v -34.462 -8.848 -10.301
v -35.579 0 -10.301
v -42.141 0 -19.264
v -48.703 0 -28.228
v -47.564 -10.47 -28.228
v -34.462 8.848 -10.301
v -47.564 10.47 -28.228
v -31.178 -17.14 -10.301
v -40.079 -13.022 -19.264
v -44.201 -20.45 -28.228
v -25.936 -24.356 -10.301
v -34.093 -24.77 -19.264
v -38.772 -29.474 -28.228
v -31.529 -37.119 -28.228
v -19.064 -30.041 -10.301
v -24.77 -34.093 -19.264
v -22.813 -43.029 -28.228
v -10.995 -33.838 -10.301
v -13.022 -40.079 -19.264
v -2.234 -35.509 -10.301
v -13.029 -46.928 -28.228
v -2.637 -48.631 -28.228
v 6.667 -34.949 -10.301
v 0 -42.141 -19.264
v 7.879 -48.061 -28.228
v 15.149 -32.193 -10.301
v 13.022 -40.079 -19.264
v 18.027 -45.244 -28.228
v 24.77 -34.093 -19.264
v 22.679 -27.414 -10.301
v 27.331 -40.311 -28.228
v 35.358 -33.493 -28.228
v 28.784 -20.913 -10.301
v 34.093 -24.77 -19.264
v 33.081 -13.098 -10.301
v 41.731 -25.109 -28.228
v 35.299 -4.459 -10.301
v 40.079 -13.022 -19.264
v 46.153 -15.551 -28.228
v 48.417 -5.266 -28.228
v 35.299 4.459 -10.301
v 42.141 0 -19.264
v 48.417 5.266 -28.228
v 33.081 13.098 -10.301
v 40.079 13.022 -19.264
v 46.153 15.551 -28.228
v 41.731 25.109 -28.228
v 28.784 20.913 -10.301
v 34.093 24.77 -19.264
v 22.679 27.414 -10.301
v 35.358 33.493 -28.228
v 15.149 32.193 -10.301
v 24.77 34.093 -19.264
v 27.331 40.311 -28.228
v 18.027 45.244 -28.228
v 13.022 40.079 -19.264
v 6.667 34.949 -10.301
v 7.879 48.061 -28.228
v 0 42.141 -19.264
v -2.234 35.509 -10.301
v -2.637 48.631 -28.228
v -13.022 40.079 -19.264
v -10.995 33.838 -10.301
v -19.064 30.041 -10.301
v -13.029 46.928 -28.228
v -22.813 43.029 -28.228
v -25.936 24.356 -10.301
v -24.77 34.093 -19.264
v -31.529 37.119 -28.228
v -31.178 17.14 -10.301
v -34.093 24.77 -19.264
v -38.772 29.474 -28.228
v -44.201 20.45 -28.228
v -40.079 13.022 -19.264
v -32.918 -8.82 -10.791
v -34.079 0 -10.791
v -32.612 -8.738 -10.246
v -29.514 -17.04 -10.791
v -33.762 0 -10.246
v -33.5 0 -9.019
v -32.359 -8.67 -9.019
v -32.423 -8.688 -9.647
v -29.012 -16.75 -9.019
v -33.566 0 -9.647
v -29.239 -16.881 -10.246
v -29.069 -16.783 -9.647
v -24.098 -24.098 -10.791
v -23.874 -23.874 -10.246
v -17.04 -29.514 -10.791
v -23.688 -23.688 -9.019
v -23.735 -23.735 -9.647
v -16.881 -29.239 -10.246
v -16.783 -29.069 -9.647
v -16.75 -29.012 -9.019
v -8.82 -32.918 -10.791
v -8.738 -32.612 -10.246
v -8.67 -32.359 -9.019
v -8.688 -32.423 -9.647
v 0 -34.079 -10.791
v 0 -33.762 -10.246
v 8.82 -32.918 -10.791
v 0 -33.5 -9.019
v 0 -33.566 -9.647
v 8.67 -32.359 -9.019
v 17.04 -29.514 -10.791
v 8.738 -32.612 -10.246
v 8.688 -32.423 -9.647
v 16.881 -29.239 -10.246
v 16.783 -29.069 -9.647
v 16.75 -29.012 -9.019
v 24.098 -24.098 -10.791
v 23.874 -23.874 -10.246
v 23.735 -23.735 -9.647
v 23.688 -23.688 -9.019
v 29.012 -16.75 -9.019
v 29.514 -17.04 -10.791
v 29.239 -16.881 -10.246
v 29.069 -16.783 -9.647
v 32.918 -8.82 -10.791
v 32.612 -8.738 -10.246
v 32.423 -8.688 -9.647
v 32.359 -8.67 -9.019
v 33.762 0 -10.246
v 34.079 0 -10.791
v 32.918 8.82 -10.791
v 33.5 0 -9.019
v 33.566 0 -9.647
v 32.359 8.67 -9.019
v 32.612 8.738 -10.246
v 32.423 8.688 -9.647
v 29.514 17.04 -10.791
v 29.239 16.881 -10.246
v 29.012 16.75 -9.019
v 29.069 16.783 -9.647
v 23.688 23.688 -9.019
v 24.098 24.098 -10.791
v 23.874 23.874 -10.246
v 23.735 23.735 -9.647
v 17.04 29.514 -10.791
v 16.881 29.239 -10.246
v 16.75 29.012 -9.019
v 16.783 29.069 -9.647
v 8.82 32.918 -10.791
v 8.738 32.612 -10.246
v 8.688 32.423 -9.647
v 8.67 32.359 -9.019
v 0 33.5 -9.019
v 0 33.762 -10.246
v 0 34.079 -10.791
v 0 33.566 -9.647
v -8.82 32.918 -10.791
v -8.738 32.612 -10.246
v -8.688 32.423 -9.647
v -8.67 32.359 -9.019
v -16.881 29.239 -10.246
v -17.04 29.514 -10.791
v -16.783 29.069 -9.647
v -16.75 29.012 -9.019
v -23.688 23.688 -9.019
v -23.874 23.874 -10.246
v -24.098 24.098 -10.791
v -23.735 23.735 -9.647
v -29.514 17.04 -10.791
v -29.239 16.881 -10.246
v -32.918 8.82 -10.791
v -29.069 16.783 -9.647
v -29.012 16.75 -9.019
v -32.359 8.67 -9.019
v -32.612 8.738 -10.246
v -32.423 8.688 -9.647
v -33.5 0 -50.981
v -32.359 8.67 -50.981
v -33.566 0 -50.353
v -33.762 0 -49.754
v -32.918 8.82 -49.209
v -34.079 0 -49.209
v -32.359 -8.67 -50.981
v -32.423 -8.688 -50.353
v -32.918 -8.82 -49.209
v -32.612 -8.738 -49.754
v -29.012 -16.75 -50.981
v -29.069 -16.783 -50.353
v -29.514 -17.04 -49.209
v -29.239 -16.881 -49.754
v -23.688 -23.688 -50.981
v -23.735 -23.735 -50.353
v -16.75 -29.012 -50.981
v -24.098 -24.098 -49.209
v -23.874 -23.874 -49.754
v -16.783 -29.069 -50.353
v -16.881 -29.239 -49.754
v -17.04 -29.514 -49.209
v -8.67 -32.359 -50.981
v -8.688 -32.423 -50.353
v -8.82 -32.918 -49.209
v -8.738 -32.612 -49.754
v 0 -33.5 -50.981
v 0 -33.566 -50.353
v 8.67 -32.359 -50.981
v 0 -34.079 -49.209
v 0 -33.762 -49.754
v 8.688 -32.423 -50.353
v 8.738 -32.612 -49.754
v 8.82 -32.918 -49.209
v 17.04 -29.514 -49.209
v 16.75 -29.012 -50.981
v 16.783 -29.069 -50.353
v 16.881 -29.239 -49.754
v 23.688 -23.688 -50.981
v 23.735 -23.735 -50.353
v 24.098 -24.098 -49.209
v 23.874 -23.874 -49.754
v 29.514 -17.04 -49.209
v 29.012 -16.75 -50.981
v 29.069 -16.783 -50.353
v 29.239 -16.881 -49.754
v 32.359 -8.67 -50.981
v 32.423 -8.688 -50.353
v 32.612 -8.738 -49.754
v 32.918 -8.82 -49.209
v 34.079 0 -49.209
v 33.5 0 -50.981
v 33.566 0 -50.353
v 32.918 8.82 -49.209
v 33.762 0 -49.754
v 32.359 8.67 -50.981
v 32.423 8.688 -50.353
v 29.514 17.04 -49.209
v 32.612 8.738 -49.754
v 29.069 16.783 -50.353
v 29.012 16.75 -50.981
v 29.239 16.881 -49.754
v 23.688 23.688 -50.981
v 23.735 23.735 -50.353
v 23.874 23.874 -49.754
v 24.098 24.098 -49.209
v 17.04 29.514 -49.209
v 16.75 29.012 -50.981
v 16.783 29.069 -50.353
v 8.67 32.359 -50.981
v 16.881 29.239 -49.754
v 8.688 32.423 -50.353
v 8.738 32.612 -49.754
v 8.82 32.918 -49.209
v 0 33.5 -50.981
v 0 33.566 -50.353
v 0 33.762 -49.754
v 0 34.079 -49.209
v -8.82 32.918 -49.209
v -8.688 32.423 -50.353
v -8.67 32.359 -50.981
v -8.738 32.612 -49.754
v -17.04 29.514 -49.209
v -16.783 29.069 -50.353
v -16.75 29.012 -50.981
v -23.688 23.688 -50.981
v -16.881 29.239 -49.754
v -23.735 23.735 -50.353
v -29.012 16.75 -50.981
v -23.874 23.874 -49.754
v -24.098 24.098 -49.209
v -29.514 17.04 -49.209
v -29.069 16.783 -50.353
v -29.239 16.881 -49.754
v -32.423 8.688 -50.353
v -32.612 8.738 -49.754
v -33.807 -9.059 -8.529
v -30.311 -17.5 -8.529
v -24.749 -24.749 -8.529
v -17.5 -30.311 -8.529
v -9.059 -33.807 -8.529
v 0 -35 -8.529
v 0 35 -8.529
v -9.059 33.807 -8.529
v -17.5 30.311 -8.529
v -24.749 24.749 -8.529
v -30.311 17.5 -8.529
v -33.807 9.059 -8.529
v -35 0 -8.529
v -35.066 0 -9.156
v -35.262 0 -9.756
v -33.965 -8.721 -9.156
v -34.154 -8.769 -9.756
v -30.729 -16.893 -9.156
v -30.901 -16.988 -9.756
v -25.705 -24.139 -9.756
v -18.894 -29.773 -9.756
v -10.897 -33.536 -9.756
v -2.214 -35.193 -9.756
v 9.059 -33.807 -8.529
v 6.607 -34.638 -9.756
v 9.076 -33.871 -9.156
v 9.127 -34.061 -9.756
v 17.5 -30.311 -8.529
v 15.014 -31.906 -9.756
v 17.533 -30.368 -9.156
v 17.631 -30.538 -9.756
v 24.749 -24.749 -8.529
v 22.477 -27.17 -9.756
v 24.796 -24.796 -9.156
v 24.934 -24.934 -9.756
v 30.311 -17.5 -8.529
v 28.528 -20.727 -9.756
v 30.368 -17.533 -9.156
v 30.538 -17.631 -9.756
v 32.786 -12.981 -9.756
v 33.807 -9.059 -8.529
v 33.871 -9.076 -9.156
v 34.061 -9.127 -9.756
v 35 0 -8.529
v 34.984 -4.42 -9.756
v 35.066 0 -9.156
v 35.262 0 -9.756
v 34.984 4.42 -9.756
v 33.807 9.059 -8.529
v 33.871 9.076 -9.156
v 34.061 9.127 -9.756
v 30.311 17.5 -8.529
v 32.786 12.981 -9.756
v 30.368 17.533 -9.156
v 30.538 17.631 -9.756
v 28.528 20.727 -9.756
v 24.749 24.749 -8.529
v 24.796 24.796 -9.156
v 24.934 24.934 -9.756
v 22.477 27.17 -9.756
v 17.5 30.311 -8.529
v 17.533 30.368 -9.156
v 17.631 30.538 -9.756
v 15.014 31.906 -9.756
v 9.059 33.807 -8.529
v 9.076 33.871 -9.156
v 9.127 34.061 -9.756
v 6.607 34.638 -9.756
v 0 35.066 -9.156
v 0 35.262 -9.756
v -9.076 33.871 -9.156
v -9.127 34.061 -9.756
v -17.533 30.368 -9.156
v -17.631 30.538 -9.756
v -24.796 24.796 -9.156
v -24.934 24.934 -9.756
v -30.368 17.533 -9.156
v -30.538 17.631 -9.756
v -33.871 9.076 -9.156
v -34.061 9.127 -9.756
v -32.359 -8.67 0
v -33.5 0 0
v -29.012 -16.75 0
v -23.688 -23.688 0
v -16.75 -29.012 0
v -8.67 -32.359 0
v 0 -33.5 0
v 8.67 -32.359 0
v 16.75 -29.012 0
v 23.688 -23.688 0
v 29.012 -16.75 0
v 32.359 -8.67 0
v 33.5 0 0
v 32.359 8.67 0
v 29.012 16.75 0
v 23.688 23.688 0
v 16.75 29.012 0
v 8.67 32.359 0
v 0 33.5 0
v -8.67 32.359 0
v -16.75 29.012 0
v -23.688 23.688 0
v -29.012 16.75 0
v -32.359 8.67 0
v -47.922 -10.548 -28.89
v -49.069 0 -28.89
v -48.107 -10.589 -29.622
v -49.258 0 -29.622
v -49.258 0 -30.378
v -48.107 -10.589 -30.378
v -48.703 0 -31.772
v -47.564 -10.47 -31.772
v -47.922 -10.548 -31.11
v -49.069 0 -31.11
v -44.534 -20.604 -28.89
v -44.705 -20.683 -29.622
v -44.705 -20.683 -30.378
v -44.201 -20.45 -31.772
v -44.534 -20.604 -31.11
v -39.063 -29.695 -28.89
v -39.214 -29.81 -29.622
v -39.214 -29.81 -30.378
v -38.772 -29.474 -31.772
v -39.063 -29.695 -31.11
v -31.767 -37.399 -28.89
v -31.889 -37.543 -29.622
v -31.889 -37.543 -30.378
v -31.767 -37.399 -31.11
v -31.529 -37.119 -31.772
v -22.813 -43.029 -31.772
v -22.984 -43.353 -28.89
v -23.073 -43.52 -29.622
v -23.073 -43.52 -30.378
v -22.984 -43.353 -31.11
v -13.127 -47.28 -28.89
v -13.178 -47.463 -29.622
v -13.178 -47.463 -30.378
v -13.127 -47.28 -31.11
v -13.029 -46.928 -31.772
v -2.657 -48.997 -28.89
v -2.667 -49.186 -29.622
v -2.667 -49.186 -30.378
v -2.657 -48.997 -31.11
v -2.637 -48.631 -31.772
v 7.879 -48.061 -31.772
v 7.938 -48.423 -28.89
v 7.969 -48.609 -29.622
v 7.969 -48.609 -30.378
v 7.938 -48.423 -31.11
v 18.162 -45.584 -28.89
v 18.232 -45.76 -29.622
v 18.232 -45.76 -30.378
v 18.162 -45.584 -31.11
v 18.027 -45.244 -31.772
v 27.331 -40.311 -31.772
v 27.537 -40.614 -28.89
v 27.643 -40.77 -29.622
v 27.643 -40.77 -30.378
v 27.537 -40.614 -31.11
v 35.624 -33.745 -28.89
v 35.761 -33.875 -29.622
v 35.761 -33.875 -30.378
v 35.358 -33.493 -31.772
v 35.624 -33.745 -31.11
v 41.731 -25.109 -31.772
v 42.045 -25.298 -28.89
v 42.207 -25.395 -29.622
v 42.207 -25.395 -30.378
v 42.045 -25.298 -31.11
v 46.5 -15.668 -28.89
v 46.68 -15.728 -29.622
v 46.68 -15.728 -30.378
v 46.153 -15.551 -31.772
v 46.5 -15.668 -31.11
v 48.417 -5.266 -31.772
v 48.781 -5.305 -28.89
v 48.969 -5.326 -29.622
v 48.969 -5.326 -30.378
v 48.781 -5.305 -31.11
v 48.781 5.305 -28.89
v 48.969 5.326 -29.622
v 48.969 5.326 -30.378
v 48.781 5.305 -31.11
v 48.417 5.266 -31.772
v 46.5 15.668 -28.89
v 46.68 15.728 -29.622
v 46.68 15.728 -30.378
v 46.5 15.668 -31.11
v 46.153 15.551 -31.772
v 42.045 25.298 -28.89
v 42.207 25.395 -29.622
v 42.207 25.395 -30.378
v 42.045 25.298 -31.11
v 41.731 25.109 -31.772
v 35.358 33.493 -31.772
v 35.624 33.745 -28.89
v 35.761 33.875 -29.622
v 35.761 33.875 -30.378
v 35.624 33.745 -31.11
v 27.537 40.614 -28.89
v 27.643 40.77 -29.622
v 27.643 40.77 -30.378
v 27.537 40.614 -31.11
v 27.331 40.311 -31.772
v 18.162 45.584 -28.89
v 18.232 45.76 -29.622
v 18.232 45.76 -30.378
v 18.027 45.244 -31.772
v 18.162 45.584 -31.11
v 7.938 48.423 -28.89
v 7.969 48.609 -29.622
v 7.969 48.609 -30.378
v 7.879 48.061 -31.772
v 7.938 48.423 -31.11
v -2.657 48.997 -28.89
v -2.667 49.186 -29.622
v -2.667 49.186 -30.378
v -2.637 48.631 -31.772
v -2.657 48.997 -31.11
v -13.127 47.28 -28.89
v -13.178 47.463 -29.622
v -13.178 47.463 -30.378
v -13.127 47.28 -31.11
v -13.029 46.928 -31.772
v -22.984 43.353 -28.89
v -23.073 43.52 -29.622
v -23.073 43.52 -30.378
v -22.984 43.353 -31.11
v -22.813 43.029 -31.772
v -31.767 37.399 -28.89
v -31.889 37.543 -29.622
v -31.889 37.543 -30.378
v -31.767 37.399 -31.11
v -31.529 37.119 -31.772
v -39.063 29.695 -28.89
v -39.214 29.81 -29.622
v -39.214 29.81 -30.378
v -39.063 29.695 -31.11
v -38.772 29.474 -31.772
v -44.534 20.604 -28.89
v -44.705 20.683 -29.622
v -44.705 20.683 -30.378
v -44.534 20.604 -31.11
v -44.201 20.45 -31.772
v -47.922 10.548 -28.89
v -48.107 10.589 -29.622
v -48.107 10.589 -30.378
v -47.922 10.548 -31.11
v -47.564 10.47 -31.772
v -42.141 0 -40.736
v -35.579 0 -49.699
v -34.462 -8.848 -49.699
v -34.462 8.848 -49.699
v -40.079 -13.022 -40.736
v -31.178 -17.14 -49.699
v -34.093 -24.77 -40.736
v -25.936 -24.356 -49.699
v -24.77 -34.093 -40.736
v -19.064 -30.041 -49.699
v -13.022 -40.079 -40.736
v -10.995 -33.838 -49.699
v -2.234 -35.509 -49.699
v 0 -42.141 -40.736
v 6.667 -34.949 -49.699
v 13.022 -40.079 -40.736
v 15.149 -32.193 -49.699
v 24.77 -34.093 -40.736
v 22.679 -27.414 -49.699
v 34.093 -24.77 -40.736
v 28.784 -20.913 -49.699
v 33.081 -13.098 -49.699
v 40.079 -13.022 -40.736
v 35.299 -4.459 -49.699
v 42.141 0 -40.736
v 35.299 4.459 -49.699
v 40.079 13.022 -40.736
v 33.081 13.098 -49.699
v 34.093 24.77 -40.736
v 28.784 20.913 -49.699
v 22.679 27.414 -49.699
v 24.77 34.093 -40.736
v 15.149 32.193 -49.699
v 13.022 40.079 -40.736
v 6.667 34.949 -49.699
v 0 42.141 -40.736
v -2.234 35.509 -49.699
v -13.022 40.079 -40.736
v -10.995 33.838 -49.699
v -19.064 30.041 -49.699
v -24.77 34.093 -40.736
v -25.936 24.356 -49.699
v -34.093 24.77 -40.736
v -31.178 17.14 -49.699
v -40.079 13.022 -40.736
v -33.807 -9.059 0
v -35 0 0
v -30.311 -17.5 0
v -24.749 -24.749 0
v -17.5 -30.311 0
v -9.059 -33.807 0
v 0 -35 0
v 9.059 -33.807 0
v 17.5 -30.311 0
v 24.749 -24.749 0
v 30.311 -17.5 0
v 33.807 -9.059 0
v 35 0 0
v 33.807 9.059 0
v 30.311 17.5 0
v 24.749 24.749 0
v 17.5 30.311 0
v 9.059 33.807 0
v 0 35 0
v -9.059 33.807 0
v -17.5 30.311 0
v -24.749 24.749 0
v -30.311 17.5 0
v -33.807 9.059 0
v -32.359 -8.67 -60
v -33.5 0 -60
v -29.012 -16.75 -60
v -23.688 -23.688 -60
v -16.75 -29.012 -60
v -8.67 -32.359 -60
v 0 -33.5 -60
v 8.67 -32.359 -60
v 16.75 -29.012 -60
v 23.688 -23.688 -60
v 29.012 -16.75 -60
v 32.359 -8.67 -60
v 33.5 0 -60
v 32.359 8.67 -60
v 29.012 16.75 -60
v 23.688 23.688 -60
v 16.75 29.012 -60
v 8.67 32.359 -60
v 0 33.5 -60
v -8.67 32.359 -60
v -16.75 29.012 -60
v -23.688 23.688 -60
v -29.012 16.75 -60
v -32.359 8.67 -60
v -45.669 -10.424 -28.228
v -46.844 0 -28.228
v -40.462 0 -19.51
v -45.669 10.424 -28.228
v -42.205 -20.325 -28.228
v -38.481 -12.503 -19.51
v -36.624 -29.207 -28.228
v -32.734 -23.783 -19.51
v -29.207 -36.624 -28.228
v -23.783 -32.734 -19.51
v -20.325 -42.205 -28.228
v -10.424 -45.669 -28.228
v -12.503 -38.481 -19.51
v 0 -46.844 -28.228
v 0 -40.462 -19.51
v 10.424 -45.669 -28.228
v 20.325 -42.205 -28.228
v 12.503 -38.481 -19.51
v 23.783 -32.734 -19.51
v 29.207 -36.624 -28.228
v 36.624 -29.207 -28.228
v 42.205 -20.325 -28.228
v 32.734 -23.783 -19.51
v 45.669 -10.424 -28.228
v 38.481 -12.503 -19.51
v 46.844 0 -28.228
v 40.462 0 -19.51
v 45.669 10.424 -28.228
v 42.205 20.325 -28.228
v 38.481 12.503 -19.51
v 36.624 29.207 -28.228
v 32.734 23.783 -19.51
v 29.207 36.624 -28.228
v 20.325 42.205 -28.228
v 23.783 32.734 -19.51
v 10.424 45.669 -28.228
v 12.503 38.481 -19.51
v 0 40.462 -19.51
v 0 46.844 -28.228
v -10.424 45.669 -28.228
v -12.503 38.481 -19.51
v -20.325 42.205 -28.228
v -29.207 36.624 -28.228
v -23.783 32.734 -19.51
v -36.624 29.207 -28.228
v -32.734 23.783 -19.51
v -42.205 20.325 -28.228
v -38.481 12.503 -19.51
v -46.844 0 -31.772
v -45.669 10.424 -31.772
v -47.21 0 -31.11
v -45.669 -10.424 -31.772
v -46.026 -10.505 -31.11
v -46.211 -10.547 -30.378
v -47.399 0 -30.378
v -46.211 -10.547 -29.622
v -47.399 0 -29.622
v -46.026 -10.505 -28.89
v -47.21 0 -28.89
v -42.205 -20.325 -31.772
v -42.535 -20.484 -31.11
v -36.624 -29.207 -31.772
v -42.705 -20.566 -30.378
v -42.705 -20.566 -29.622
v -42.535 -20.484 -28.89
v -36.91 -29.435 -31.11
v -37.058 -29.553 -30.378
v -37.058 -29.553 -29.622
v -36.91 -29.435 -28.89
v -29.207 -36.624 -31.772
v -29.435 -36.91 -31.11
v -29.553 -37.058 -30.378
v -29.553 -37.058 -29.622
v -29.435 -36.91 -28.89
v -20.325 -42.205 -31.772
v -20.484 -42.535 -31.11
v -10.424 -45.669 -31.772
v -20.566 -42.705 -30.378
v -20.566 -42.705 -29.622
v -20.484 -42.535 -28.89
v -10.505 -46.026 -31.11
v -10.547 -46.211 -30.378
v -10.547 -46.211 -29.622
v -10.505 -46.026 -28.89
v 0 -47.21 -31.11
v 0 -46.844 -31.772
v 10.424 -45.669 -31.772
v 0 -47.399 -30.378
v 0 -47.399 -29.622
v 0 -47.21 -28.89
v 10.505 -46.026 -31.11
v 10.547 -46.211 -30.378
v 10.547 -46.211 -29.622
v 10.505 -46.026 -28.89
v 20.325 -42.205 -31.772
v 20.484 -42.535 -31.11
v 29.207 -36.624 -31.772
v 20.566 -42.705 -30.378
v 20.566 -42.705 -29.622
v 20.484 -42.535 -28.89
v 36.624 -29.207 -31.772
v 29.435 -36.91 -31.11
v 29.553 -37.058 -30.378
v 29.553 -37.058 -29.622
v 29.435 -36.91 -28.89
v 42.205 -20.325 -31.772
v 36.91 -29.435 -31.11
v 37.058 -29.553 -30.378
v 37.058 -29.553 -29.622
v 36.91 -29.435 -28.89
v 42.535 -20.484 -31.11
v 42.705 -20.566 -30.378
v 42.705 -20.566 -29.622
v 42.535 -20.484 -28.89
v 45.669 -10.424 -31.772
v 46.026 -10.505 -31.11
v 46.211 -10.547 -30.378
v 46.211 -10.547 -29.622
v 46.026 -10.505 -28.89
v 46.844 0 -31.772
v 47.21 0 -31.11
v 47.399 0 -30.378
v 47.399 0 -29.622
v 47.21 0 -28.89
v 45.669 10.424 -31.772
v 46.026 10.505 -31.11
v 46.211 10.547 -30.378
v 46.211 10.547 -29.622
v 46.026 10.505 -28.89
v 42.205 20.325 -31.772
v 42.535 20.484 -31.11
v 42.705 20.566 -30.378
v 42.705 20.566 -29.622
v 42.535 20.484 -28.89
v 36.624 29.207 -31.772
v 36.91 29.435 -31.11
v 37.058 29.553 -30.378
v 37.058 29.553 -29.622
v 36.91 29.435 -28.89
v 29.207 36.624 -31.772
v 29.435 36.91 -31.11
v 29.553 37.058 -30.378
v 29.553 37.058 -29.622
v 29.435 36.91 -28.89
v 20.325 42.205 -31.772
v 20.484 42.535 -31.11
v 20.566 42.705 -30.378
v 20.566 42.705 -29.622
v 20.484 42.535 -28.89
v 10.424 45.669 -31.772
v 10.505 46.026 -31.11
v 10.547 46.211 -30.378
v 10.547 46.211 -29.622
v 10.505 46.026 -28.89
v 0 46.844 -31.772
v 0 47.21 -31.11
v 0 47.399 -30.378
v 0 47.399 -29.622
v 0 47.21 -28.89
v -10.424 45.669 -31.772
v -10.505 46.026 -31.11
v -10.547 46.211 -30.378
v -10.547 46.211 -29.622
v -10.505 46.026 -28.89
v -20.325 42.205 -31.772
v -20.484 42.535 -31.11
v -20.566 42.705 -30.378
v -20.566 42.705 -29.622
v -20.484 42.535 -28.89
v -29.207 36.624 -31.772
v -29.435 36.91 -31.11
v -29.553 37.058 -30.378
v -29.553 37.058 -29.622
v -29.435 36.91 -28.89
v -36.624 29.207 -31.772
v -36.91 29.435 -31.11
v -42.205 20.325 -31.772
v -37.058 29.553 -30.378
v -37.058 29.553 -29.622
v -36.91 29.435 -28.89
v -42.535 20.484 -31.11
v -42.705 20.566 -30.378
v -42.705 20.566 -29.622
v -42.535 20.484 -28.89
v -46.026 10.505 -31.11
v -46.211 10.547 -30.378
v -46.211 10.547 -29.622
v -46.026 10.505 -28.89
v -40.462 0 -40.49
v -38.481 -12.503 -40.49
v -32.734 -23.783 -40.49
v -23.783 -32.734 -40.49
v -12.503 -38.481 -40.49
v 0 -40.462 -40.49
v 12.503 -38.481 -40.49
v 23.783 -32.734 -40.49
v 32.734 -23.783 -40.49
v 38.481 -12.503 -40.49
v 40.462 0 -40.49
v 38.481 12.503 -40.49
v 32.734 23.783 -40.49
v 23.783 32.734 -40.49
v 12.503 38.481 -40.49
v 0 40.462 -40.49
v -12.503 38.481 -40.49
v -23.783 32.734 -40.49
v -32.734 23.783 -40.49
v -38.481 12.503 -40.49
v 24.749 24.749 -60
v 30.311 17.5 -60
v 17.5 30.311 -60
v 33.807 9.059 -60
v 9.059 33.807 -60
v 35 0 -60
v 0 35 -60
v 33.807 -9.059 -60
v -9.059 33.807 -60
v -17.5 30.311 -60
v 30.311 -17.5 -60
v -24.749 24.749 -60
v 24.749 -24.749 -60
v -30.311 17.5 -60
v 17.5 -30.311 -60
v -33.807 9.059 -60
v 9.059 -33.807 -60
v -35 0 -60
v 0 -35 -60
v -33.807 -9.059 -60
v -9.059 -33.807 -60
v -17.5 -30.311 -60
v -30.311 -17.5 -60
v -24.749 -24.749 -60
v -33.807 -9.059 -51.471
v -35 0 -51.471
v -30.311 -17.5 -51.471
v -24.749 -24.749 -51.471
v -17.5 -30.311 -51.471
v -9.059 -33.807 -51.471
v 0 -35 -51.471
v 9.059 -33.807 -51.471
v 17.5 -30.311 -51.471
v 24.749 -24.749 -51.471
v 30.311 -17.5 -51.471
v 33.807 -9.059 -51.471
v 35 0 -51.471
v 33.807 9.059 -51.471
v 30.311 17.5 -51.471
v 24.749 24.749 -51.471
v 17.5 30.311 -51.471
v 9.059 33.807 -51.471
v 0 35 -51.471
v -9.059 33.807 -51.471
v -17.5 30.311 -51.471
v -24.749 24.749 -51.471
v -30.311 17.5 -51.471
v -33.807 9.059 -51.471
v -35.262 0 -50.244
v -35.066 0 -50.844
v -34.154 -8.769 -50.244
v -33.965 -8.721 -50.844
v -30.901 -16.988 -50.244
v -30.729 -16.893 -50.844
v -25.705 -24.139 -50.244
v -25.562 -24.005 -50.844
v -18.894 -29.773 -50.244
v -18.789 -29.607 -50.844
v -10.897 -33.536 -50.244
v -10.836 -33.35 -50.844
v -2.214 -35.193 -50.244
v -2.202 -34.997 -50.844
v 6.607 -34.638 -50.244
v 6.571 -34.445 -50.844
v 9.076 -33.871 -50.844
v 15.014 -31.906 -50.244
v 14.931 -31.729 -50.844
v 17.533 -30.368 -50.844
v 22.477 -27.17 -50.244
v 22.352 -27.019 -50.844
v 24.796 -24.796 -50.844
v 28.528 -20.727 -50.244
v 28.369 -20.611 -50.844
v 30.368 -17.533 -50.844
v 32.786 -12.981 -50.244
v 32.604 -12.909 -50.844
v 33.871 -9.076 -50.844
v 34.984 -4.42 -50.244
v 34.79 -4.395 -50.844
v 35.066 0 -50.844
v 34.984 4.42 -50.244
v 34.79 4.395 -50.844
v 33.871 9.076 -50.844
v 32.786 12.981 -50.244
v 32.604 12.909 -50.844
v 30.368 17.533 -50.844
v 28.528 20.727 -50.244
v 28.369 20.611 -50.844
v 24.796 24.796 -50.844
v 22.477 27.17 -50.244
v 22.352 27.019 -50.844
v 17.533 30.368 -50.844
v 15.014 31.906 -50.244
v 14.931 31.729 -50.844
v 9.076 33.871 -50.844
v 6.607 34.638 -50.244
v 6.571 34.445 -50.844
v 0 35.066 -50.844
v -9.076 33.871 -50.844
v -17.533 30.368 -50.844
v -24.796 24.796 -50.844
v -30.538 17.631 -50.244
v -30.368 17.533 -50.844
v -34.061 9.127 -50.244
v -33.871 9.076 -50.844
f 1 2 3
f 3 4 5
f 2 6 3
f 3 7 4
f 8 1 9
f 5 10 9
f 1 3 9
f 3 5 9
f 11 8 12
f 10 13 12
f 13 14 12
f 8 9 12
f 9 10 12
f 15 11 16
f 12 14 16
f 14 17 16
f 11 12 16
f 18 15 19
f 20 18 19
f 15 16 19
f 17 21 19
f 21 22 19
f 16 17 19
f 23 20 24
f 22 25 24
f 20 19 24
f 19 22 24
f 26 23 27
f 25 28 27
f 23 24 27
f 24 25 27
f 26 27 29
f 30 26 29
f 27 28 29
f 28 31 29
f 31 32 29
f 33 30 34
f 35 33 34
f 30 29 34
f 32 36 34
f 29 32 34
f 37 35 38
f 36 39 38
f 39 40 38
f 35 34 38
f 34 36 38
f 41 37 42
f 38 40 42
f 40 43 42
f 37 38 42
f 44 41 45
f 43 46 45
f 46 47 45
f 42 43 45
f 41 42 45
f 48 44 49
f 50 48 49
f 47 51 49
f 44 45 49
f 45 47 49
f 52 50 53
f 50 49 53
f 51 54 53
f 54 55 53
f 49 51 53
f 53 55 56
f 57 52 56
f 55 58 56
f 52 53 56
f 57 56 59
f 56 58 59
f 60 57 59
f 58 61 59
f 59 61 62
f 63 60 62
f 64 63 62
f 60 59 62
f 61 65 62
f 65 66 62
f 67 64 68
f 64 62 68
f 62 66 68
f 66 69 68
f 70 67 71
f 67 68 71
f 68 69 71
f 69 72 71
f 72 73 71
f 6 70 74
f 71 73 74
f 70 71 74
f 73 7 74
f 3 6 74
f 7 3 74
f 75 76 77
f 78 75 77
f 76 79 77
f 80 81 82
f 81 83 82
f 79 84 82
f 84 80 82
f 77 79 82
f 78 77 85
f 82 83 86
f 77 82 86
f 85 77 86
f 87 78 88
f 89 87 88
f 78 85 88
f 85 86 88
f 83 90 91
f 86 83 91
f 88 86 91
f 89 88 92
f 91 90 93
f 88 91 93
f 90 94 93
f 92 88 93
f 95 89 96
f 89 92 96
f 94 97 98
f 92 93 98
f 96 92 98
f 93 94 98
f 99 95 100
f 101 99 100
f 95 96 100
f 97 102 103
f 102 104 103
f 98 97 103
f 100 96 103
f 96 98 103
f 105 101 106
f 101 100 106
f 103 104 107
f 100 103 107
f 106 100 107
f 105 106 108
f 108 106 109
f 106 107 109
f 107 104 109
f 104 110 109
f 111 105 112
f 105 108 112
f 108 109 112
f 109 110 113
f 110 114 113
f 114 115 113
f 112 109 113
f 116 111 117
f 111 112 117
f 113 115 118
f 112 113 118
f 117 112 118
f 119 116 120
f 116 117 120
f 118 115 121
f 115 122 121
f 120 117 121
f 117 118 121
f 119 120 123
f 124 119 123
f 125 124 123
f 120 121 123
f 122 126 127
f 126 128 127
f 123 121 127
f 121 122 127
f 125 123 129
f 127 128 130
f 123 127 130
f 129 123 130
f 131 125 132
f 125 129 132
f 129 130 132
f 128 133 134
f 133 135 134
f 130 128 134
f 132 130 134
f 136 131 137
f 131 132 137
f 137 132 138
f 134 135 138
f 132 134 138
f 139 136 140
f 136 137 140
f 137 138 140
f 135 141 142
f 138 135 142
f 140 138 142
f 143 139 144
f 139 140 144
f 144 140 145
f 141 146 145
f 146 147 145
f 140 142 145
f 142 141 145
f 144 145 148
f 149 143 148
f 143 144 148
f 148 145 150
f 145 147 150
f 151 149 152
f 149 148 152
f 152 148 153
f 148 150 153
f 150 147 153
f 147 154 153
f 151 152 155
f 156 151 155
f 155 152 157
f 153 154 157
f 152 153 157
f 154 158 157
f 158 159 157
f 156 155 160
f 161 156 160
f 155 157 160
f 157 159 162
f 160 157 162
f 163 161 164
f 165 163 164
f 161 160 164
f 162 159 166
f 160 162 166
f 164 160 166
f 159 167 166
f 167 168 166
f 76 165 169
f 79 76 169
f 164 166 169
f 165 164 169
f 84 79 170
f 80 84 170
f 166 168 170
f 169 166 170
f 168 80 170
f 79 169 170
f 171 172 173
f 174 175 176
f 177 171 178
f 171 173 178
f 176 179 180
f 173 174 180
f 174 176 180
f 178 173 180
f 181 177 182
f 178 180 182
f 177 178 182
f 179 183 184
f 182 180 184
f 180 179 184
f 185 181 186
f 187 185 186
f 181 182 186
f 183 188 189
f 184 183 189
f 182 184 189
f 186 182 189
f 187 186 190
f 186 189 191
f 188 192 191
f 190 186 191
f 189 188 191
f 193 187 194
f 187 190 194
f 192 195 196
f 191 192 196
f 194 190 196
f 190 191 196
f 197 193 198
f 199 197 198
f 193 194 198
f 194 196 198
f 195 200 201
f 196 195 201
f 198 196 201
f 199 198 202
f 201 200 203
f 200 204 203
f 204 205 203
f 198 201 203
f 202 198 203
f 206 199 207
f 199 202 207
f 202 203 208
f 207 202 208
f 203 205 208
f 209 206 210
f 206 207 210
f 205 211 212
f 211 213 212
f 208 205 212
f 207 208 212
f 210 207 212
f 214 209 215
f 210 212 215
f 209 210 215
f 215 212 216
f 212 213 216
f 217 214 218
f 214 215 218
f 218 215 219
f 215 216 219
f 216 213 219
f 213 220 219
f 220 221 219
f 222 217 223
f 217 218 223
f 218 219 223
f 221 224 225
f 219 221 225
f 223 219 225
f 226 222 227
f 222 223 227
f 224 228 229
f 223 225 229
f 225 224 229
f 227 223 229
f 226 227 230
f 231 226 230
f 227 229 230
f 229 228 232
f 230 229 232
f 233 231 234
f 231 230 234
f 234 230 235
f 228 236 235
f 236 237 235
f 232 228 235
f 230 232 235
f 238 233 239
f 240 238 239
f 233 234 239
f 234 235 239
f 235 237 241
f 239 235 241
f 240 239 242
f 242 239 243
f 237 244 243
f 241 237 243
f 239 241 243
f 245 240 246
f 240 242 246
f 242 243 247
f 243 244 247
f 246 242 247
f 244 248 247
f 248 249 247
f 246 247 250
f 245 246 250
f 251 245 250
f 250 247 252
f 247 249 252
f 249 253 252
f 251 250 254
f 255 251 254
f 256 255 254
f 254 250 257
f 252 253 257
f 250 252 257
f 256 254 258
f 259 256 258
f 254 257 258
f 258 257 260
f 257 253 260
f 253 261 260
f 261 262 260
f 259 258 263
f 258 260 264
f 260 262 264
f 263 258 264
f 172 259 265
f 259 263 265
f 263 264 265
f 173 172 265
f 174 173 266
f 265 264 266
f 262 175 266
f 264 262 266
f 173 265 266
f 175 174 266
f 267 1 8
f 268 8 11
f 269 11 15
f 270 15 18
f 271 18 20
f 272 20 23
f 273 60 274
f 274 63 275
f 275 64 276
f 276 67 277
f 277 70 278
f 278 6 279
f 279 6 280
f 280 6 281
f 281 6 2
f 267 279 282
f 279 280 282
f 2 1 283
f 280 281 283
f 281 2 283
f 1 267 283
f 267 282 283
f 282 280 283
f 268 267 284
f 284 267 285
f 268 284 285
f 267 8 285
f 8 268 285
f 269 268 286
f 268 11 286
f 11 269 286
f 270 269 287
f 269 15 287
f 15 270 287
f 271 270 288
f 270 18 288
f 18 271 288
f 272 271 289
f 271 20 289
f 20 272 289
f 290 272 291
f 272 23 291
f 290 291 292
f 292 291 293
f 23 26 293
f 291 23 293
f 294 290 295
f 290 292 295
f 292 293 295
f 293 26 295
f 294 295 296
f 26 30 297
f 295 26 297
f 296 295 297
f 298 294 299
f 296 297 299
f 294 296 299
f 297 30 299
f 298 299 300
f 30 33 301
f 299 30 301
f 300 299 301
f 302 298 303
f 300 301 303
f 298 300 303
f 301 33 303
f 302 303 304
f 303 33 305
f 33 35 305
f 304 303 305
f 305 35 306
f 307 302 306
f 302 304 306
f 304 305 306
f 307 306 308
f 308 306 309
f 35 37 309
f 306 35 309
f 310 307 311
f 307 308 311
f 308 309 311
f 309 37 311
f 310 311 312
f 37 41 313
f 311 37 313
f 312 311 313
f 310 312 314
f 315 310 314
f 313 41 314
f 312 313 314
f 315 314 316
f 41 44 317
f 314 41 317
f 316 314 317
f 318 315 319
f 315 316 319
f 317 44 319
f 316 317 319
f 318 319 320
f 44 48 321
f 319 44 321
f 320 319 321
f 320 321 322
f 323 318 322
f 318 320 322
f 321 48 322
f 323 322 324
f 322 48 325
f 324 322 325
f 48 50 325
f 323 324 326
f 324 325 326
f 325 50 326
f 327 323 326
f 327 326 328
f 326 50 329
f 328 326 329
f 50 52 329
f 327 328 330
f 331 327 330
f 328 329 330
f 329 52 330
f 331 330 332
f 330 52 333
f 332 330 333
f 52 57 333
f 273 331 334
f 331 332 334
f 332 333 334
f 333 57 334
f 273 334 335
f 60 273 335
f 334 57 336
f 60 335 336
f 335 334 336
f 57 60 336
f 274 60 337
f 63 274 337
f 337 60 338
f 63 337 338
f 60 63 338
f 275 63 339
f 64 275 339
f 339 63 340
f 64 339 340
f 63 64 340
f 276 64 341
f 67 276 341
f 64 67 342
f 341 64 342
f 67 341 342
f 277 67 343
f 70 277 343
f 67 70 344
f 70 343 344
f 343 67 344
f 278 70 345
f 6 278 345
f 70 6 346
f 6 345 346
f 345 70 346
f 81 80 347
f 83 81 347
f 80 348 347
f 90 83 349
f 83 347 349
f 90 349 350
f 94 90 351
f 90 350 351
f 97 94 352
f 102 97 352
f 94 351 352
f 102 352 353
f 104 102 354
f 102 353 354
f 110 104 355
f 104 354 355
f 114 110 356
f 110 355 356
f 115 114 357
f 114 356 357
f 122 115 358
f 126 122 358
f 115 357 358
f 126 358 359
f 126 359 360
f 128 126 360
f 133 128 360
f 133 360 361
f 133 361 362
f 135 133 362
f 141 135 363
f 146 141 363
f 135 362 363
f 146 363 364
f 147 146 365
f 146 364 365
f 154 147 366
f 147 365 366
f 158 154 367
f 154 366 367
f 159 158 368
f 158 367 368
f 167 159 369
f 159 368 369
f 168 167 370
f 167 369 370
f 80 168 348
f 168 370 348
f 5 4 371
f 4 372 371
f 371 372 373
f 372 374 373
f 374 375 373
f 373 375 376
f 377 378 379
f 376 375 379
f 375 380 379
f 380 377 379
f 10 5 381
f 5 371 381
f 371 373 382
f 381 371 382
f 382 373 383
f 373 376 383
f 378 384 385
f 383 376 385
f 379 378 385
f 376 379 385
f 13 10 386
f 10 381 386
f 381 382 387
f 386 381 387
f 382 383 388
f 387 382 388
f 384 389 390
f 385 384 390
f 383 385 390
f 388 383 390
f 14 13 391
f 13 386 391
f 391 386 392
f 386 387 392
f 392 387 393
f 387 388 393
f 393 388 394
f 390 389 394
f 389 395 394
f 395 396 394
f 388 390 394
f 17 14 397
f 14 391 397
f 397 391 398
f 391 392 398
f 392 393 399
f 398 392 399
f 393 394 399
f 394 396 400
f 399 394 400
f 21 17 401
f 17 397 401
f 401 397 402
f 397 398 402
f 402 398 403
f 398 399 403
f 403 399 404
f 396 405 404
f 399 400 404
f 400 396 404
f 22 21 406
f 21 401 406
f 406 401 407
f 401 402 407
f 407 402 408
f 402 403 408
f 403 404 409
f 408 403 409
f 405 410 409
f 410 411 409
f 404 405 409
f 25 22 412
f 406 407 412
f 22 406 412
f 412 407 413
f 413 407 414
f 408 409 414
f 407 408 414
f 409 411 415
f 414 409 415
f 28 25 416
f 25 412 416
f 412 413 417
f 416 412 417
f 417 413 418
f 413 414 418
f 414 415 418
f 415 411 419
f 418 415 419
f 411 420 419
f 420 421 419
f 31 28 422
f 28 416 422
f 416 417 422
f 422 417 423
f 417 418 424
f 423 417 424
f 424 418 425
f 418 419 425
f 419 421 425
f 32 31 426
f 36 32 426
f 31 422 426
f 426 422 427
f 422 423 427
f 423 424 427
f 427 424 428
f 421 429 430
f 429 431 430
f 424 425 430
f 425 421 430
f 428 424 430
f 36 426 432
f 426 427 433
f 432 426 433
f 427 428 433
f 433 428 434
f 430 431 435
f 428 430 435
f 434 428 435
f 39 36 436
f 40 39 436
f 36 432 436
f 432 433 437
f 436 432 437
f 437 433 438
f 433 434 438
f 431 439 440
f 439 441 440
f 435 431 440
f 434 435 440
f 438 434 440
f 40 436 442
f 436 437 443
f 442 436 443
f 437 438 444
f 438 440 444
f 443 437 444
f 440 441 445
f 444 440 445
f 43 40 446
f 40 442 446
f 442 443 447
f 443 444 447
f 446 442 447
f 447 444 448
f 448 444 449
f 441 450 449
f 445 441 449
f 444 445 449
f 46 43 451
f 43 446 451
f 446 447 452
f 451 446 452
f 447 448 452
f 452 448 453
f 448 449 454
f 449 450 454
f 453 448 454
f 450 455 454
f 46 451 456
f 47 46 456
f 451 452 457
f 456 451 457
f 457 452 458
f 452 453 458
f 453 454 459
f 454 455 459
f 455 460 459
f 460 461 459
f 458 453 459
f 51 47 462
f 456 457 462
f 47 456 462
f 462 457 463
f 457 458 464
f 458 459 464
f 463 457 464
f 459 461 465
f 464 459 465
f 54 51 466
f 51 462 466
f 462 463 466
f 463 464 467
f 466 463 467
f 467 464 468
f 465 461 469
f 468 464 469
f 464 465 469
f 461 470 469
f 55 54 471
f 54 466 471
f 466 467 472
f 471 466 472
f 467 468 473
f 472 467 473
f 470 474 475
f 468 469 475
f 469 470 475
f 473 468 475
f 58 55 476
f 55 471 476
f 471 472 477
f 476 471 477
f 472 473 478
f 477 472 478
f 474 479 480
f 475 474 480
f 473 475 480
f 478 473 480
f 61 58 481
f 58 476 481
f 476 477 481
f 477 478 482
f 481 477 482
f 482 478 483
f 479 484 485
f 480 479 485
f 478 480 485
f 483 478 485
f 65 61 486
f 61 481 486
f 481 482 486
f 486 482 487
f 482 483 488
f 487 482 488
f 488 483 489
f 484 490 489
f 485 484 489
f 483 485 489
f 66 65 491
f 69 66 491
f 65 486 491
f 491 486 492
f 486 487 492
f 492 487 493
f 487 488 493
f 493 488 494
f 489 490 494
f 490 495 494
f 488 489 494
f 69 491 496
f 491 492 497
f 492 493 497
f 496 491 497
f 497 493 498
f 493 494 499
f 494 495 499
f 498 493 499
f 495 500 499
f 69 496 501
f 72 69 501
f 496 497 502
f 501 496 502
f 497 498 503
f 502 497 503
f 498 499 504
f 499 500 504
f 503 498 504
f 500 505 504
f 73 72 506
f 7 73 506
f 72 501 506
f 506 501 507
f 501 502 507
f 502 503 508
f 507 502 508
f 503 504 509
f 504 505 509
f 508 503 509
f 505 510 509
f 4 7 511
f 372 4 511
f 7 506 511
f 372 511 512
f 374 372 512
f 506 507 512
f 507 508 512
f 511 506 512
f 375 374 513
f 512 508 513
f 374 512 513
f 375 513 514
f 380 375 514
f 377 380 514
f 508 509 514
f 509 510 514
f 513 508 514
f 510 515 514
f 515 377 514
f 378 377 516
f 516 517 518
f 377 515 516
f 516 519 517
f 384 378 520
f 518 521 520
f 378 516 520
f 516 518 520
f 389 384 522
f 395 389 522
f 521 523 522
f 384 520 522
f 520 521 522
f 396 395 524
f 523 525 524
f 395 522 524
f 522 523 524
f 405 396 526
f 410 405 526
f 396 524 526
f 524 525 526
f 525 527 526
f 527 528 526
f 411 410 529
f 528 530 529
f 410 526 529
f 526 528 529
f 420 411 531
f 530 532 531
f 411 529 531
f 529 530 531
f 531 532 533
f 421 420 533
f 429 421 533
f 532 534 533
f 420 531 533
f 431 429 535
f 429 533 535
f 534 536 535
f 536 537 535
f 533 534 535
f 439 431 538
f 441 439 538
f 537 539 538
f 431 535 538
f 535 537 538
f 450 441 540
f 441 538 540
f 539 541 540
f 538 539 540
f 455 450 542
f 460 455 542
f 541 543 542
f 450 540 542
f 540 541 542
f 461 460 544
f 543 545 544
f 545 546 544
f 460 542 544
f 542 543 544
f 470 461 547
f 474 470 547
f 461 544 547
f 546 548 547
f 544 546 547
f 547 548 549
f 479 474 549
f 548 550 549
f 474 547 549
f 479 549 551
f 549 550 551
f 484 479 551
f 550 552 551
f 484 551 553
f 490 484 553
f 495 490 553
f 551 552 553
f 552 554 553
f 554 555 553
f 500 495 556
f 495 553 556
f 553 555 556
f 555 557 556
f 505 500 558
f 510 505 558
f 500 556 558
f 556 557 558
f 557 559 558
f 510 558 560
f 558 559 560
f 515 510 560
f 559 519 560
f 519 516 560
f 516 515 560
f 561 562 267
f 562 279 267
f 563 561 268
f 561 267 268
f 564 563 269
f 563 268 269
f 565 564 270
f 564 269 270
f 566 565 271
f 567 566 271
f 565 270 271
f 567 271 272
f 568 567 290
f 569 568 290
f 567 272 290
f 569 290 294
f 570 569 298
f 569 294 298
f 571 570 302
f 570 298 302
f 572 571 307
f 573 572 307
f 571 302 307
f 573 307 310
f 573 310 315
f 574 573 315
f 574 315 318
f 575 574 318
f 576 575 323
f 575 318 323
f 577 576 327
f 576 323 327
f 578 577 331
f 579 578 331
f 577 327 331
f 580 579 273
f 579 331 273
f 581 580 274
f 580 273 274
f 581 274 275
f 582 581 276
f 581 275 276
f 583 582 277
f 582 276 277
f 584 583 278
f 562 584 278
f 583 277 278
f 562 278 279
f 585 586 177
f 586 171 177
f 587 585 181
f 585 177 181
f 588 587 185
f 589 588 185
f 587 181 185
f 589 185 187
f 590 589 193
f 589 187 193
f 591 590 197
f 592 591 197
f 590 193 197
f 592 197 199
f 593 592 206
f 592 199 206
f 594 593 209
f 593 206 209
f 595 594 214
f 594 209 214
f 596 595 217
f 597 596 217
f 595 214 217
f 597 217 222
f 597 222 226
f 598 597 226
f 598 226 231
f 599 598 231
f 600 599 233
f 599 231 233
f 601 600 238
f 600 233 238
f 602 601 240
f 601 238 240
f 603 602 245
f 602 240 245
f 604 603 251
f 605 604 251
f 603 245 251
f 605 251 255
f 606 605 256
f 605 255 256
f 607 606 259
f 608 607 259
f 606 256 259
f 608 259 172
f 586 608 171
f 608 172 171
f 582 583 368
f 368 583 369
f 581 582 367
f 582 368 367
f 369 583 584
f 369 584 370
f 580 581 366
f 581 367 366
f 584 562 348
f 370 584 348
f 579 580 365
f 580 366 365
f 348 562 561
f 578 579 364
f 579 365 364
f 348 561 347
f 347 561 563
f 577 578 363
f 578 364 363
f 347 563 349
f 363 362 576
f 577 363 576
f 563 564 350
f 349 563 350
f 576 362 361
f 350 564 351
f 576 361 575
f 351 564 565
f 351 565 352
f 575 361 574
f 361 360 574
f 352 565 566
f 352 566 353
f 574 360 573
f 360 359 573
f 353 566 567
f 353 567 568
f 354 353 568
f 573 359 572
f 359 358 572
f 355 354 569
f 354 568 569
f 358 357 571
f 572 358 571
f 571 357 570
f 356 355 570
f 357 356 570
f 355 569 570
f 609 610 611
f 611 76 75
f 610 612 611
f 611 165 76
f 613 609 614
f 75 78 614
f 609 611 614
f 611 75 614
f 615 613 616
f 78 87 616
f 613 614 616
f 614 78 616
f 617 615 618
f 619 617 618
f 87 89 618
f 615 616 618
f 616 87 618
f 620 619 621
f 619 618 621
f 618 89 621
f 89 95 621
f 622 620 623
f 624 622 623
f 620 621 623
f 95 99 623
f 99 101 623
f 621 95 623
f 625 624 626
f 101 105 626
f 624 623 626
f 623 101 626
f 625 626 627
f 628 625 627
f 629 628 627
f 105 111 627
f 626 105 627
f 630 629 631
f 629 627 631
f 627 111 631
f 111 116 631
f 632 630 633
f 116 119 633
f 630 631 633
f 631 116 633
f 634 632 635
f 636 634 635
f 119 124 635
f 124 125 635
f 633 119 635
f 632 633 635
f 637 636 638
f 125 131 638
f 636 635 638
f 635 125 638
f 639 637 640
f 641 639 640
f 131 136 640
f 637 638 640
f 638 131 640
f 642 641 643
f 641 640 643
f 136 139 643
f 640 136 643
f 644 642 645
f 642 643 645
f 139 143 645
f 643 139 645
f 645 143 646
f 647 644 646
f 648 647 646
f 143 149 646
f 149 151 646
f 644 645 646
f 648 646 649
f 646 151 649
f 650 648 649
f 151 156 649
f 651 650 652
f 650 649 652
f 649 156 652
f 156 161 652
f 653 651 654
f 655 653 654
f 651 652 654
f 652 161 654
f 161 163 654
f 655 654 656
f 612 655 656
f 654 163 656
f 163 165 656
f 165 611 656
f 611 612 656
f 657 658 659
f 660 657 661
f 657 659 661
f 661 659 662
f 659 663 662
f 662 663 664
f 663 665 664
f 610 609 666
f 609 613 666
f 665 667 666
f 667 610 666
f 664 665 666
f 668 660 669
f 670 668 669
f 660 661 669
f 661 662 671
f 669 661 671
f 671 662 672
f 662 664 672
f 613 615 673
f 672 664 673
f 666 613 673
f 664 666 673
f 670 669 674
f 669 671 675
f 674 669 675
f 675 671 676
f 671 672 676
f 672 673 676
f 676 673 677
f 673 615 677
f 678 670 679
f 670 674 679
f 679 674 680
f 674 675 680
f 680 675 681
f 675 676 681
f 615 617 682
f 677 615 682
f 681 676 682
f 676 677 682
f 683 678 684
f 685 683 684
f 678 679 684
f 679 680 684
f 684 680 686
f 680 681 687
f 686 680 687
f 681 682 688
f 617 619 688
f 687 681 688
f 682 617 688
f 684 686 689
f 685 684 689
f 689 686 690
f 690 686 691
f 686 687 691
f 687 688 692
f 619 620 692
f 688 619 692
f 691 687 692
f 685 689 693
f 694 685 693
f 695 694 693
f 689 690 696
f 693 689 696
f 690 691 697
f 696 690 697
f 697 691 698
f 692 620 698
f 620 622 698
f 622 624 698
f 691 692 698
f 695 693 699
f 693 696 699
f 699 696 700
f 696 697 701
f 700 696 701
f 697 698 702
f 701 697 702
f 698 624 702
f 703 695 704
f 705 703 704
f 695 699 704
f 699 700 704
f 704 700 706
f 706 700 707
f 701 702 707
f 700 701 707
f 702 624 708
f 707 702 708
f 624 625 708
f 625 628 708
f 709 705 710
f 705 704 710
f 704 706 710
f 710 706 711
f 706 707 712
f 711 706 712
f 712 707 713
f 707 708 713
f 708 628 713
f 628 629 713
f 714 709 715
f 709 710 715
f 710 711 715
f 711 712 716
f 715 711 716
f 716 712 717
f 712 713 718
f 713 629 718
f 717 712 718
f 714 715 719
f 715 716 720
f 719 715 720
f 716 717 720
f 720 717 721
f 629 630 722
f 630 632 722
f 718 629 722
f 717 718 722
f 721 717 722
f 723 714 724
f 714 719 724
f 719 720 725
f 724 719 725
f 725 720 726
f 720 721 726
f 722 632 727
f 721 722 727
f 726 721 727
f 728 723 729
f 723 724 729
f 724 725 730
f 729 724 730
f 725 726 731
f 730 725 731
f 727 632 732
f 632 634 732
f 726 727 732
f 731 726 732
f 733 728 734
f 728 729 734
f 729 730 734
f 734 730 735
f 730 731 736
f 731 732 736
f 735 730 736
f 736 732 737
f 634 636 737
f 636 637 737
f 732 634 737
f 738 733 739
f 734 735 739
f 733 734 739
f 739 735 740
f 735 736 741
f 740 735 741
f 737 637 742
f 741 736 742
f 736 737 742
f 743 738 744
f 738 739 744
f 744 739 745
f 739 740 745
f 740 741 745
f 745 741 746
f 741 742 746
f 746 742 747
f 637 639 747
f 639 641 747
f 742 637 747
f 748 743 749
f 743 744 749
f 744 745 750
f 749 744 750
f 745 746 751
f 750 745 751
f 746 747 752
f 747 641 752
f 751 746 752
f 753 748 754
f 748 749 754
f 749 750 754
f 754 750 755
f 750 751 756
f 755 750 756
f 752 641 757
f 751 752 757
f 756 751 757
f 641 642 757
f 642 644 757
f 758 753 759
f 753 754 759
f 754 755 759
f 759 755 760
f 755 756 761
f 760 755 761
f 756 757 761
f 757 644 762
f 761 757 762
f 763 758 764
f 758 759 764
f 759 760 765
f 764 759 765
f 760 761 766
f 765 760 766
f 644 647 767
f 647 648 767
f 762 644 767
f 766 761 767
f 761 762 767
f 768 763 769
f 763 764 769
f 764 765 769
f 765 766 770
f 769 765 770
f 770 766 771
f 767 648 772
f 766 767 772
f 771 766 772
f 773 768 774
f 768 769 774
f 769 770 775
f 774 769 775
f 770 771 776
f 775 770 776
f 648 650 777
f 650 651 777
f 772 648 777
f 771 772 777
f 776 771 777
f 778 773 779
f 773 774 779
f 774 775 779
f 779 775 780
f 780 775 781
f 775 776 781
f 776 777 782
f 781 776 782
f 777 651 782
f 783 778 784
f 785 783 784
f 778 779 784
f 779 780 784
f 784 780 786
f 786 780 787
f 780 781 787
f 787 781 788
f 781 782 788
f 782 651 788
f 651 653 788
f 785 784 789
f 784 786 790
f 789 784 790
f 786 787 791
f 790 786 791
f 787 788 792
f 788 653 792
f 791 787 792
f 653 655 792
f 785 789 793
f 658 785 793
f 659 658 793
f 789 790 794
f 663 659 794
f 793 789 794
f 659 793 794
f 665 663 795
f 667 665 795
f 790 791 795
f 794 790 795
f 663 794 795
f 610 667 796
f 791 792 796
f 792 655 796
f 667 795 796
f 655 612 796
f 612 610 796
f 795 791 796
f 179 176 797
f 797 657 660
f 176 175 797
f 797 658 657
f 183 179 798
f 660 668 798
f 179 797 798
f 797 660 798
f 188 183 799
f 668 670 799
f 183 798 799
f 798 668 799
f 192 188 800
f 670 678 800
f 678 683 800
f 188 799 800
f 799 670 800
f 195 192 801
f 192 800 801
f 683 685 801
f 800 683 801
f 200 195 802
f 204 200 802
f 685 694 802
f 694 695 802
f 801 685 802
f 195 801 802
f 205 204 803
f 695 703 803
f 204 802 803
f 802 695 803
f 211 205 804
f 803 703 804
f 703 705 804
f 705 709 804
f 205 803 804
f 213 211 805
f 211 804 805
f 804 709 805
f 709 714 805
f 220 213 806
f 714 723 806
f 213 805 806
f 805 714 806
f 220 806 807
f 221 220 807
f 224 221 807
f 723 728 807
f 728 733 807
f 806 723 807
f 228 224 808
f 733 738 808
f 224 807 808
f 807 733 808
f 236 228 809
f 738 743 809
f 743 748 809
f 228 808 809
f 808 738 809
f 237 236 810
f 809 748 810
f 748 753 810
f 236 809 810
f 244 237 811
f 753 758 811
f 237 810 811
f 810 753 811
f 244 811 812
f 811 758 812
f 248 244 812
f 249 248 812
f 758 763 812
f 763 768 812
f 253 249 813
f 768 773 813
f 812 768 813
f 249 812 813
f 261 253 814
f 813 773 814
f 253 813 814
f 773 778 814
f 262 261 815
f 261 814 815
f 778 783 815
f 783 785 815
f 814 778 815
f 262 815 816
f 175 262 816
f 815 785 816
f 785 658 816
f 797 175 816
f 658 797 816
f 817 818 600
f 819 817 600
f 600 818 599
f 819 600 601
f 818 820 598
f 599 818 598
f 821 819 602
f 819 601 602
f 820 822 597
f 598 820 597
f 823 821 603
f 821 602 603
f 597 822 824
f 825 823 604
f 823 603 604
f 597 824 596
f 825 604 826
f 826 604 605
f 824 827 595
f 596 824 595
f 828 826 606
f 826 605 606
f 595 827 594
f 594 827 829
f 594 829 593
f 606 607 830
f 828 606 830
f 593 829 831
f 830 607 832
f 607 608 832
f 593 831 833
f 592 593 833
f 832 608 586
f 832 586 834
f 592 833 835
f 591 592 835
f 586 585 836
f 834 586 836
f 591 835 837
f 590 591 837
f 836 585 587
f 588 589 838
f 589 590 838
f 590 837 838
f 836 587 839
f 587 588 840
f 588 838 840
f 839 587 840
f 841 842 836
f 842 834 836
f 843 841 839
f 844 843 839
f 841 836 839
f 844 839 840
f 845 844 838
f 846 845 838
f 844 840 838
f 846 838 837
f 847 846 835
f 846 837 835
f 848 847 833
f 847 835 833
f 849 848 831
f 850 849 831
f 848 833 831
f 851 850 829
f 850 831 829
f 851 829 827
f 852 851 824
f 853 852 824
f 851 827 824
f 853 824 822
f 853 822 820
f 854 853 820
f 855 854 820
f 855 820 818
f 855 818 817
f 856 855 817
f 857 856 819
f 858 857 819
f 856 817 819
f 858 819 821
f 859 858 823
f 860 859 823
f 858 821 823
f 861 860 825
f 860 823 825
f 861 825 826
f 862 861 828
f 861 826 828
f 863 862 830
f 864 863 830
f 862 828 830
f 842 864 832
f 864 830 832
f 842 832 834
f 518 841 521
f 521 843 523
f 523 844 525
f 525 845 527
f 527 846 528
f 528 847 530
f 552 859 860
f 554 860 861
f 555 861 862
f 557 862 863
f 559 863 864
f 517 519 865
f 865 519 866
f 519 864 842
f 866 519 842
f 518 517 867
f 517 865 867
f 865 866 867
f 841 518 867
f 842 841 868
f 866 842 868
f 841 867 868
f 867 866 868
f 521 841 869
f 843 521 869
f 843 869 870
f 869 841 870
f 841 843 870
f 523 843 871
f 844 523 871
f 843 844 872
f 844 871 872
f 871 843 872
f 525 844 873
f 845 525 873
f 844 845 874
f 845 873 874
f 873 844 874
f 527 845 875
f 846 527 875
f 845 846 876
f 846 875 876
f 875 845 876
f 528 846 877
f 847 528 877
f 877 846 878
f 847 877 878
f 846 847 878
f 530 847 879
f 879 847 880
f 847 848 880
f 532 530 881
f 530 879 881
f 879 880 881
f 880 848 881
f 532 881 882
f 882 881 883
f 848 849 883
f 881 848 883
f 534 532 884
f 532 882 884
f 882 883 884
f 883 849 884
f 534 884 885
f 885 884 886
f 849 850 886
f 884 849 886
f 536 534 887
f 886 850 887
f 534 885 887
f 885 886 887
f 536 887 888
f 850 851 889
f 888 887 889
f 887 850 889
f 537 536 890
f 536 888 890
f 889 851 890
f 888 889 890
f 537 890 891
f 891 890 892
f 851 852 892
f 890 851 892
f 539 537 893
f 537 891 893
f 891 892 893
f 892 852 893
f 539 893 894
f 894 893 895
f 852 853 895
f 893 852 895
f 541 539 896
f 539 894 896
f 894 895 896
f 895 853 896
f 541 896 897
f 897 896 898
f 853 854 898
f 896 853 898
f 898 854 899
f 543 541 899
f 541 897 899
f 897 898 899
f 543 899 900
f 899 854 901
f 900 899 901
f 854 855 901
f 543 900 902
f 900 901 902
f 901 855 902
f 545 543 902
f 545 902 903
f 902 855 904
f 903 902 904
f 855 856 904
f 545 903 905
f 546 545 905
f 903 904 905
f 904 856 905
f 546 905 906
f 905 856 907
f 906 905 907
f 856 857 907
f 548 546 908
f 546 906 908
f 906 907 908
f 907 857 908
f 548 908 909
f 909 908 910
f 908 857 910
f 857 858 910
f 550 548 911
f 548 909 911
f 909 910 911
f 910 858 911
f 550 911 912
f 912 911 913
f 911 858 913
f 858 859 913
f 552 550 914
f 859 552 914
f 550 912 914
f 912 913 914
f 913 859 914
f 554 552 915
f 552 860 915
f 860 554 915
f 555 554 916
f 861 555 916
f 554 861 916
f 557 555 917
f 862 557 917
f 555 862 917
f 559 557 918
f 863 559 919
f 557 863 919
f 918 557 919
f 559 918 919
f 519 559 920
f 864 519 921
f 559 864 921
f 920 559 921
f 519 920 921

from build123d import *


with BuildPart() as part:
    # Sketch1 → Revolve1 (revolve)
    with BuildSketch(Plane(origin=(0, 0, 0), x_dir=(1, 0, 0), z_dir=(0, 1, 0))):
        with BuildLine():
            Line((-35, 0), (-35, 8.528910447))
            ThreePointArc((-35, 8.528910447), (-35.148501992, 9.461090209), (-35.579306073, 10.300982937))
            Line((-35.579306073, 10.300982937), (-48.702751771, 28.22792751))
            ThreePointArc((-48.702751771, 28.22792751), (-49.282057844, 30), (-48.702751771, 31.77207249))
            Line((-48.702751771, 31.77207249), (-35.579306073, 49.699017063))
            ThreePointArc((-35.579306073, 49.699017063), (-35.148501992, 50.538909791), (-35, 51.471089553))
            Line((-35, 51.471089553), (-35, 60))
            Line((-35, 60), (-33.5, 60))
            Line((-33.5, 60), (-33.5, 50.980726369))
            ThreePointArc((-33.5, 50.980726369), (-33.648501992, 50.048546606), (-34.079306073, 49.208653878))
            Line((-34.079306073, 49.208653878), (-46.843780693, 31.77207249))
            ThreePointArc((-46.843780693, 31.77207249), (-47.423086766, 30), (-46.843780693, 28.22792751))
            Line((-46.843780693, 28.22792751), (-34.079306073, 10.791346122))
            ThreePointArc((-34.079306073, 10.791346122), (-33.648501992, 9.951453394), (-33.5, 9.019273631))
            Line((-33.5, 9.019273631), (-33.5, 0))
            Line((-33.5, 0), (-35, 0))
        make_face()
    revolve(axis=Axis((0, 0, -72.546995865), (0, 0, 1)))


solid = part.part
